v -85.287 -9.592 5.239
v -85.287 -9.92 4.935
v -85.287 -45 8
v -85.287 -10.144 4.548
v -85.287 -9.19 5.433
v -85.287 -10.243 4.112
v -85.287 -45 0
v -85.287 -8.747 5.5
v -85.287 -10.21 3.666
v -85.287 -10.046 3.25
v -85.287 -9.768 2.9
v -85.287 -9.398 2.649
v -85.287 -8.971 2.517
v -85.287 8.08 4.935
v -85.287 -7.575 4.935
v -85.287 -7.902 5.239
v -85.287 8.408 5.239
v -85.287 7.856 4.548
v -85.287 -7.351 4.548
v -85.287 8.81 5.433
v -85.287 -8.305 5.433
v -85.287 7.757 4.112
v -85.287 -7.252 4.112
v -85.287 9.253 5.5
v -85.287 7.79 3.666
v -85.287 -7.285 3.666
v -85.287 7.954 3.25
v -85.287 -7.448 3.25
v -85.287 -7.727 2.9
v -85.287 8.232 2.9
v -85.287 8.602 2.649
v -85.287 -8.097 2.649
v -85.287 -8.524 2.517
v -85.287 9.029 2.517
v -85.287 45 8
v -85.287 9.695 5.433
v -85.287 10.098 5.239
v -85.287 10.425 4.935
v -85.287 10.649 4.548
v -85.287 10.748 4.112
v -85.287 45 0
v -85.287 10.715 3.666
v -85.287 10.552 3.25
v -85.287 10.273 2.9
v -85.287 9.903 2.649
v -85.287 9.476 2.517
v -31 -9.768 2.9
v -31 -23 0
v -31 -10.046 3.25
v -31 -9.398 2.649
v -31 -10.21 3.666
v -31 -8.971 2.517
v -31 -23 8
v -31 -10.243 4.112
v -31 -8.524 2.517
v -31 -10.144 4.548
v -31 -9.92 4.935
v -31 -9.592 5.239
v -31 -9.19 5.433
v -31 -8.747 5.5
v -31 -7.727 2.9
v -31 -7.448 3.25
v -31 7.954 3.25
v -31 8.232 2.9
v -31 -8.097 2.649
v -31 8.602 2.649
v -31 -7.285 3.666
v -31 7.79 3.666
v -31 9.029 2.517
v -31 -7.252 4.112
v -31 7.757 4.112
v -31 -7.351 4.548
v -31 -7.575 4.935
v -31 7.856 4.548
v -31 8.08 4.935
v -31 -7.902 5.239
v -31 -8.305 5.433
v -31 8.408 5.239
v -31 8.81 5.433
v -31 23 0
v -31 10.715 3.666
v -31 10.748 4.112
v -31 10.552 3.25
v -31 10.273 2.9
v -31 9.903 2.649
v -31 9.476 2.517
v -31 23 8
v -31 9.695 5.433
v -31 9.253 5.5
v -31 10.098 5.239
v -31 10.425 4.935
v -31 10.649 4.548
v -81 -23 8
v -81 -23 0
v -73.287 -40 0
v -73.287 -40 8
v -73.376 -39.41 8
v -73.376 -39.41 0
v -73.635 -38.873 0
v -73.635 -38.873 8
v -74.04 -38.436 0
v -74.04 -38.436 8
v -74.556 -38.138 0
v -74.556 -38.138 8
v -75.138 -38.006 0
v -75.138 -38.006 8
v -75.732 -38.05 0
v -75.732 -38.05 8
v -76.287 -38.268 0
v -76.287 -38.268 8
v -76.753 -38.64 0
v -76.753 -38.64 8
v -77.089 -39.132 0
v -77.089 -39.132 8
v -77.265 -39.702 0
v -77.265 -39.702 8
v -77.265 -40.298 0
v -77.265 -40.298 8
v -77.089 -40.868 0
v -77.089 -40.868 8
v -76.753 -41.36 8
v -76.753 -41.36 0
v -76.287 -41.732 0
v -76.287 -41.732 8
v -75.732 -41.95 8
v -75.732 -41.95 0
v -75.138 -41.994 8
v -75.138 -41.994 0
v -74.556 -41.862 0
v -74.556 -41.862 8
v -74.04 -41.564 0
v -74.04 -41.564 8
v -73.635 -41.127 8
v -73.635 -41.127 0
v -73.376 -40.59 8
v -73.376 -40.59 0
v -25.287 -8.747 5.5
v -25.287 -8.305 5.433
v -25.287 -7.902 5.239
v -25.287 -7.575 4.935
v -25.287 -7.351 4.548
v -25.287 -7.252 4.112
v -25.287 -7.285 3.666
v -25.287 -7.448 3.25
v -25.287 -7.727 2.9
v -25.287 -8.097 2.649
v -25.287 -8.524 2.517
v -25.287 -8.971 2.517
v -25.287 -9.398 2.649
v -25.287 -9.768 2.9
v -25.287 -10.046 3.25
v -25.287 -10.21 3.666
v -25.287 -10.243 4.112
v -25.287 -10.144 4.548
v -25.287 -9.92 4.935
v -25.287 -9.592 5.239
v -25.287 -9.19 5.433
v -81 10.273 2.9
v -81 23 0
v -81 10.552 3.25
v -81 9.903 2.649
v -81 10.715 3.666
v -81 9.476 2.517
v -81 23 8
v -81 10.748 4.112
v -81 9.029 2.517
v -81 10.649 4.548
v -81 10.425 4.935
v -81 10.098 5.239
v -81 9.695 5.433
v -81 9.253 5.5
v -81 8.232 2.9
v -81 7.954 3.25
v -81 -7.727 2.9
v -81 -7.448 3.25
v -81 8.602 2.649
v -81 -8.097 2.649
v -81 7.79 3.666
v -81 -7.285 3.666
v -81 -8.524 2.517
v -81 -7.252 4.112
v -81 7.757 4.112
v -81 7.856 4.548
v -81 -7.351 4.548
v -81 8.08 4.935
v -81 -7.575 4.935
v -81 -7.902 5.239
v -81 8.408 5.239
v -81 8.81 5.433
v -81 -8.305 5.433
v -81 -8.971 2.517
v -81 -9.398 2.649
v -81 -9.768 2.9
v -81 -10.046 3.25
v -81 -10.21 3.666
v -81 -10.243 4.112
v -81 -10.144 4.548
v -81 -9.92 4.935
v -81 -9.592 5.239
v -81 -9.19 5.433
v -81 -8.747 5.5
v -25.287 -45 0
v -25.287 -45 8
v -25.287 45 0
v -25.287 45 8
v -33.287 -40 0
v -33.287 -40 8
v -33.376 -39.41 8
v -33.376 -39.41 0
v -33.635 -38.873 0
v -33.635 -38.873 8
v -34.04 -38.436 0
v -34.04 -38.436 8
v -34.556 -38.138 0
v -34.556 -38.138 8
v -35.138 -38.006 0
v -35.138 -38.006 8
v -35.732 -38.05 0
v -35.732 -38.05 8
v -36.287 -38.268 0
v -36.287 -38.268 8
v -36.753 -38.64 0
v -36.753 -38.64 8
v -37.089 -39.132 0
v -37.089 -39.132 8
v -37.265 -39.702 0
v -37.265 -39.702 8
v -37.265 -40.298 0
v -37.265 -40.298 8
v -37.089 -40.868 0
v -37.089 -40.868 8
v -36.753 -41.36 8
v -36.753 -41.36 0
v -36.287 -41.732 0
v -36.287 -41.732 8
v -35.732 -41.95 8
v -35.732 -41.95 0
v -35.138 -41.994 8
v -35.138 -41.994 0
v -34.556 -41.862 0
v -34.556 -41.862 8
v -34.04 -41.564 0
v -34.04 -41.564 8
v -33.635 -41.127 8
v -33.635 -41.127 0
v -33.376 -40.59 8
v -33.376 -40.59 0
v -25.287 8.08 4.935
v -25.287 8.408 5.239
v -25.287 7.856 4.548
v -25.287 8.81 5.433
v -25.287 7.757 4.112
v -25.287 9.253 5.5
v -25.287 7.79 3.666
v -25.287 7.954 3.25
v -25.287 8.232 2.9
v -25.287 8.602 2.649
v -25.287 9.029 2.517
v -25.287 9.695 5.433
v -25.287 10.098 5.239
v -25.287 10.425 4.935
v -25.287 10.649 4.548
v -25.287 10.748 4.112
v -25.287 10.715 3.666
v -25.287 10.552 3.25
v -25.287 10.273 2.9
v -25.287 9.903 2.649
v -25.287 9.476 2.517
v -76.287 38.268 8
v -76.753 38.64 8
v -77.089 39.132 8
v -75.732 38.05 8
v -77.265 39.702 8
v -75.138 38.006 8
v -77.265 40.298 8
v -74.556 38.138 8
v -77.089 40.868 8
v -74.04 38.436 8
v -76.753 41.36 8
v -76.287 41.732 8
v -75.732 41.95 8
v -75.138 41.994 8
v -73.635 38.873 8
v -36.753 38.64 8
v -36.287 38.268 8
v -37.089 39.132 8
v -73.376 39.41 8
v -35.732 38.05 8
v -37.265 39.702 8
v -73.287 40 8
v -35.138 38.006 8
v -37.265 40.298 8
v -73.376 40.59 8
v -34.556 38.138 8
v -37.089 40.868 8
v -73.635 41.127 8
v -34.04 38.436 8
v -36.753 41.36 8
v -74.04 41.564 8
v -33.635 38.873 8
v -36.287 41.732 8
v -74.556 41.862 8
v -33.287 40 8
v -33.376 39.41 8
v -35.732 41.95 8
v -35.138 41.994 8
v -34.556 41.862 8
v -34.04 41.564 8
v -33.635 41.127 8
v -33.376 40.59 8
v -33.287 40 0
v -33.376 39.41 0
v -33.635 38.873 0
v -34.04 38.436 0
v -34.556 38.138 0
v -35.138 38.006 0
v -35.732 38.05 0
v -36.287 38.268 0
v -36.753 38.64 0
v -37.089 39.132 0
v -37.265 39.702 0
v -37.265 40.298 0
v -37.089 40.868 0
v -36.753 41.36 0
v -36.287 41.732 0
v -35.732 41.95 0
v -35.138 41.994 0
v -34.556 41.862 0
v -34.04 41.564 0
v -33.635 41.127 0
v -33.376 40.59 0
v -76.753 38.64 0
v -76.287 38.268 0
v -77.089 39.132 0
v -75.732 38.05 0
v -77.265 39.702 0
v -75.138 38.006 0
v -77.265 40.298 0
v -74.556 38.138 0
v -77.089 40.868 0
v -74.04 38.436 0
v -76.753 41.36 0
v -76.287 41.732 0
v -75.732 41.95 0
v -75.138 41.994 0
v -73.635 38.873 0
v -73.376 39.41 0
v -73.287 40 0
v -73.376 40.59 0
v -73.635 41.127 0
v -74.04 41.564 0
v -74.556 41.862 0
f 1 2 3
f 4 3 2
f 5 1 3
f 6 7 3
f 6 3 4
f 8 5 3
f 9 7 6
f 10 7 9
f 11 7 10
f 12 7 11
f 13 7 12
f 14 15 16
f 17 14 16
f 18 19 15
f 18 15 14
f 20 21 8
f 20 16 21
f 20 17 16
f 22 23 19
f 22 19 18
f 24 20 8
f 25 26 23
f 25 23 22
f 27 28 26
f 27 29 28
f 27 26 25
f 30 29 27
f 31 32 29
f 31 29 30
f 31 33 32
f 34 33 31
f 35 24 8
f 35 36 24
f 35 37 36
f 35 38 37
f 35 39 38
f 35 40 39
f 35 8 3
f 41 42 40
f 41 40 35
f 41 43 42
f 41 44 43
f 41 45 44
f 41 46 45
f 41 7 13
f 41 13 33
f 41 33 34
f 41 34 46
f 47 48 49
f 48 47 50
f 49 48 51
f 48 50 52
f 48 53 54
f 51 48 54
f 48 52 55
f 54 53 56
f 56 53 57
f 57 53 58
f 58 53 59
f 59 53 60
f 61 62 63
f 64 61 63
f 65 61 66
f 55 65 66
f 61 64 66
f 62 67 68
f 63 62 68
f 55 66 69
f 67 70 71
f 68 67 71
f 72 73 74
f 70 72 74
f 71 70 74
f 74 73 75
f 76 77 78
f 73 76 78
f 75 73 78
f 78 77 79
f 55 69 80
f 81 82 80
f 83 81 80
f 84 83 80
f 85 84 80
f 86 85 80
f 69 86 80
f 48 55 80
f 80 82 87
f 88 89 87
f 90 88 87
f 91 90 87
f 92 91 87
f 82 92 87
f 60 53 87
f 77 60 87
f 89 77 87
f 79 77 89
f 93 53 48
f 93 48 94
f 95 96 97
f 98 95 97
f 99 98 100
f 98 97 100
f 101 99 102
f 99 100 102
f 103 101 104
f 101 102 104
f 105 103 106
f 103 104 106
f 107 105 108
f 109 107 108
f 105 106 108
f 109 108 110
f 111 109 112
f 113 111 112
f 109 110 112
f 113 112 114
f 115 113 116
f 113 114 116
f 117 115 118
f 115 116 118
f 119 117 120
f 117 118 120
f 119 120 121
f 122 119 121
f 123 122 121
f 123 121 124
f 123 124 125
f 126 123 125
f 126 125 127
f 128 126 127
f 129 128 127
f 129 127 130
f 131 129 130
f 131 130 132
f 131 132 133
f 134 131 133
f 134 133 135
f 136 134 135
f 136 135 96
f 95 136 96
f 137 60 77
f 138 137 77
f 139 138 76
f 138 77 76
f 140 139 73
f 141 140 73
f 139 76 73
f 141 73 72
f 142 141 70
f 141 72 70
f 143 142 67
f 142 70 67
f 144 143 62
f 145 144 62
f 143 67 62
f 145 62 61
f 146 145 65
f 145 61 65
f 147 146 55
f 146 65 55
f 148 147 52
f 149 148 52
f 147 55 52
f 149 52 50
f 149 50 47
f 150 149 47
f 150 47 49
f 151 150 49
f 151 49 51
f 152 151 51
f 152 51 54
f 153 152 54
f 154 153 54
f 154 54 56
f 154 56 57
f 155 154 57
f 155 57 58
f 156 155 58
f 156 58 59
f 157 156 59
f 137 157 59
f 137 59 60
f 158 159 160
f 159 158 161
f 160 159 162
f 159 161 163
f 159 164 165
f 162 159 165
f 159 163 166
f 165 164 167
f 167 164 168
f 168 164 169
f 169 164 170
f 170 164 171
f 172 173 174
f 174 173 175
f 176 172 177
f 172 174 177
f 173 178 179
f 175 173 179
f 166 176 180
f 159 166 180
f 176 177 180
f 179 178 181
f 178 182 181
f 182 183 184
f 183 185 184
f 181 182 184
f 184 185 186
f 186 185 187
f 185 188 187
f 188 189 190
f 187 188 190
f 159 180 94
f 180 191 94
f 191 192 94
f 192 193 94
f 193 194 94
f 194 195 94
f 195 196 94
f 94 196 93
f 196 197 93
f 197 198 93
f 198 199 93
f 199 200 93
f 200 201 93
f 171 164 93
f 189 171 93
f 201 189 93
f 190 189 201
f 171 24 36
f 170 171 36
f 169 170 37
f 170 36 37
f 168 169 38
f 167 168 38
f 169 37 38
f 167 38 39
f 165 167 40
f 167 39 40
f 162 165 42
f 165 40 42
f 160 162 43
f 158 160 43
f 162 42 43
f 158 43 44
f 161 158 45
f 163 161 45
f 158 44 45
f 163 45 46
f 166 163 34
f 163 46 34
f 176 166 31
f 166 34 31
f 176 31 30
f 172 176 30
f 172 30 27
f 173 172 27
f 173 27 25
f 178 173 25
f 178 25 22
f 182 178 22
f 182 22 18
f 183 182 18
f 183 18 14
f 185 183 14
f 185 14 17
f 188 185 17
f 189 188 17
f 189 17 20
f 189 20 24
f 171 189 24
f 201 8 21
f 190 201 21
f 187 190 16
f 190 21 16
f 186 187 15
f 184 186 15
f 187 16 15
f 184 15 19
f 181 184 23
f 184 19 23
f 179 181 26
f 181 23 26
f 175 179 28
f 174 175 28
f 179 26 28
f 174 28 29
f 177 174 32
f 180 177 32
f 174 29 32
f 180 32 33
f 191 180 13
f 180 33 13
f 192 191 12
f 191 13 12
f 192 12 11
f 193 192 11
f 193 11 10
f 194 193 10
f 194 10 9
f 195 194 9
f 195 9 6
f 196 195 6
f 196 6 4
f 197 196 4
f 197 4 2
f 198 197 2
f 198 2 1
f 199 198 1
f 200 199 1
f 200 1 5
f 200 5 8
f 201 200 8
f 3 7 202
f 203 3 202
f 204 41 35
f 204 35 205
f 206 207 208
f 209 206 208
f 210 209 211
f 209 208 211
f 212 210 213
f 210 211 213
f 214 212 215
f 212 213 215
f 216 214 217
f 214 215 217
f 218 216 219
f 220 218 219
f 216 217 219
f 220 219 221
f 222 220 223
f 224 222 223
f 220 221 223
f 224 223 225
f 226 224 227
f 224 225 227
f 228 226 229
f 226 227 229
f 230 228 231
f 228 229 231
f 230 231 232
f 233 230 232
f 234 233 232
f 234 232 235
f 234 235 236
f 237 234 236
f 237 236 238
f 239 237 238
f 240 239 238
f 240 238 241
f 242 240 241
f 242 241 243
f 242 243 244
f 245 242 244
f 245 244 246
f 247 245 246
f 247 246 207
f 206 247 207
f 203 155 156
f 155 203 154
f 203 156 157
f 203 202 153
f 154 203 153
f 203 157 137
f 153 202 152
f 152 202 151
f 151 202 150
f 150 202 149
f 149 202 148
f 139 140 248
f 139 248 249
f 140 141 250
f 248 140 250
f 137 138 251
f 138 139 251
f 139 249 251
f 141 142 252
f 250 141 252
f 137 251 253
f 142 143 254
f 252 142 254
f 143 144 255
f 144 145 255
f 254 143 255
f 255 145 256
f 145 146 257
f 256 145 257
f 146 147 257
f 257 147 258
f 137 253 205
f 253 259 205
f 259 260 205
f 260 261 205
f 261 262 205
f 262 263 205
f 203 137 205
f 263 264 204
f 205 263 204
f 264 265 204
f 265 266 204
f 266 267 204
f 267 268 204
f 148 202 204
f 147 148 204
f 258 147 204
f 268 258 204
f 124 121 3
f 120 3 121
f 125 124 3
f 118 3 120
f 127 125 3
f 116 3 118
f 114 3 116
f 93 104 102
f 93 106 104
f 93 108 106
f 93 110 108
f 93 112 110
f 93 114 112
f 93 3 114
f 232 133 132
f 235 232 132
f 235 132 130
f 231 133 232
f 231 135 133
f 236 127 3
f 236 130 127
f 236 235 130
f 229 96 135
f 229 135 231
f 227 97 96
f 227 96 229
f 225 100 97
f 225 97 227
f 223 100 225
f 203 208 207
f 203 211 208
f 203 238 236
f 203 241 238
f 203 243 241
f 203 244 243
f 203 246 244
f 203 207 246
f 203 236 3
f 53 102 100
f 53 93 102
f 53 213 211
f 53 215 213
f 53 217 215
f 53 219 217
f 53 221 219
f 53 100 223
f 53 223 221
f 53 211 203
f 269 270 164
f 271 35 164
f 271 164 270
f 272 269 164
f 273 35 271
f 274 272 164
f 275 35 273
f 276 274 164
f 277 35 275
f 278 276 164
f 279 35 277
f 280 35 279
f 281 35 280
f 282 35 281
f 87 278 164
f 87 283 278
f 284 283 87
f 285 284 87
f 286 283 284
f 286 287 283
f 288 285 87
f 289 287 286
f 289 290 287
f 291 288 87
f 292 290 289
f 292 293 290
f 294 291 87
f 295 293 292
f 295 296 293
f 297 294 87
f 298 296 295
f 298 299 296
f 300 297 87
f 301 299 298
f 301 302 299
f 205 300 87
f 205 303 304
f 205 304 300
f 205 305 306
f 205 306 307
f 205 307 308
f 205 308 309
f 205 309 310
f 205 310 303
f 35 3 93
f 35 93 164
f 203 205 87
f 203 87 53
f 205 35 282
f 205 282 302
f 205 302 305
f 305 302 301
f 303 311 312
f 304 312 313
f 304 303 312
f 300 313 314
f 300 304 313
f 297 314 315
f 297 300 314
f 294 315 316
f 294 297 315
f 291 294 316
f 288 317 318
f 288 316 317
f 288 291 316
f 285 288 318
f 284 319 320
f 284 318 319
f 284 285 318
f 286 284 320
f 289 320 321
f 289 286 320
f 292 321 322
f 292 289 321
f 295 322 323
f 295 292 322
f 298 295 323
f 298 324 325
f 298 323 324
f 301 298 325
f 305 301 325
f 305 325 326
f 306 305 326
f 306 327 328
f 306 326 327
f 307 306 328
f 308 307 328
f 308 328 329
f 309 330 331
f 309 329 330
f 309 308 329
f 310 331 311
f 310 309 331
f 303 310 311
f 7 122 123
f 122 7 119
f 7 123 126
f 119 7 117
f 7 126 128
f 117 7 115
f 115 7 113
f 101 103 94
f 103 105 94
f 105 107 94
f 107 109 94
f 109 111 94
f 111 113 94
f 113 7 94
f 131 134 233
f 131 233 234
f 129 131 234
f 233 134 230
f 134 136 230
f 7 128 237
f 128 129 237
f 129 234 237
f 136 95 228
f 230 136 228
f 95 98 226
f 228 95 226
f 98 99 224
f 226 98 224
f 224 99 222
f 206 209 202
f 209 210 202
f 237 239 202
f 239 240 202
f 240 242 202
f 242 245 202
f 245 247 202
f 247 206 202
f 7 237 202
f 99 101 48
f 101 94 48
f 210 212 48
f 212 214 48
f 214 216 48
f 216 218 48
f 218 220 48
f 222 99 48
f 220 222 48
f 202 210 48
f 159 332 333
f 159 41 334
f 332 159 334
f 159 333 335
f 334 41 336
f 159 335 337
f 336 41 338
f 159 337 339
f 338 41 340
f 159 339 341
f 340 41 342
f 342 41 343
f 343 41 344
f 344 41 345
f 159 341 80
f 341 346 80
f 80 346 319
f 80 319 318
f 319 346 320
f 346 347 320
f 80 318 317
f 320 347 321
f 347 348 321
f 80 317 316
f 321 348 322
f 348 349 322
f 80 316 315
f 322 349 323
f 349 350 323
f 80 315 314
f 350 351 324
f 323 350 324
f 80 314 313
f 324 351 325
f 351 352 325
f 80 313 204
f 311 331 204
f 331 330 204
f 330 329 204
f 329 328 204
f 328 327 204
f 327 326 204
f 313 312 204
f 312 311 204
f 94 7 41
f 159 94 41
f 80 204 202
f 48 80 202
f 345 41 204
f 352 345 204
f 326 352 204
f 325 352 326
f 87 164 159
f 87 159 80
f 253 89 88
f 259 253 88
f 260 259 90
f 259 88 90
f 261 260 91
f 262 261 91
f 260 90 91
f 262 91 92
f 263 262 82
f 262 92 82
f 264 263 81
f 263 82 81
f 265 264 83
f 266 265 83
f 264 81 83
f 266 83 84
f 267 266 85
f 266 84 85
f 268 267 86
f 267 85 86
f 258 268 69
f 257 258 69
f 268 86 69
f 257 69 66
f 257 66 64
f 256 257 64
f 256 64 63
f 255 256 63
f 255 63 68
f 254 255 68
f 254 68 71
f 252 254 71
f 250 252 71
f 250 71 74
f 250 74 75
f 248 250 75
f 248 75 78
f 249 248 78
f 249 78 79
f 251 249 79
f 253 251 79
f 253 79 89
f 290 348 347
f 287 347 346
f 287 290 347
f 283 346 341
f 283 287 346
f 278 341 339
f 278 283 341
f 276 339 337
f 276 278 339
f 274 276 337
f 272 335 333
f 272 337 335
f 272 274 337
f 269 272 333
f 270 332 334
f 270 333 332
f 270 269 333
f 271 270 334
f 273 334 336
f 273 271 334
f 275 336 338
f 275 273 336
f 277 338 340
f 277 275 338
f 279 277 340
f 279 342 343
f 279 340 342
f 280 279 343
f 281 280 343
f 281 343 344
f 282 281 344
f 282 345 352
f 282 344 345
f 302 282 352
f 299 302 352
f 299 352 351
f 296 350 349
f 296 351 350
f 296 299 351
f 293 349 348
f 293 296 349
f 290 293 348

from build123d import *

# Parameters (mm, degrees)
SKETCH_1_W          = 60
SKETCH_1_H          = 90
EXTRUDE_1_DEPTH     = 8
CUT_EXTRUDE_1_REACH = 98.762
SKETCH_3_R          = 2
CUT_EXTRUDE_2_DEPTH = 97.762010118
SKETCH_4_R          = 1.5
CUT_EXTRUDE_3_DEPTH = 76.425459893


with BuildPart() as part:
    # 草图1 → 凸台-拉伸1 (new body)
    with BuildSketch(Plane.XY):
        with Locations((-55.287083442, 0)):
            Rectangle(SKETCH_1_W, SKETCH_1_H)
    extrude(amount=EXTRUDE_1_DEPTH)

    # 草图2 → 切除-拉伸1 (cut, up to next)
    with BuildSketch(Plane.XY.offset(8), mode=Mode.PRIVATE) as cut_extrude_1_sk1:
        Polygon((-81, 17), (-81, 23), (-31, 23), (-31, 17), (-31, -17), (-31, -23), (-81, -23), (-81, -17), align=None)
    cut_extrude_1_tool1 = extrude(cut_extrude_1_sk1.sketch, amount=-CUT_EXTRUDE_1_REACH, mode=Mode.PRIVATE) & part.part
    add(cut_extrude_1_tool1.solids().sort_by_distance((-56, 0, 8))[0], mode=Mode.SUBTRACT)

    # 草图3 → 切除-拉伸2 (cut, through all)
    with BuildSketch(Plane.XY.offset(8)):
        with Locations((-75.287083442, -40)):
            Circle(SKETCH_3_R)
        with Locations((-35.287083442, -40)):
            Circle(SKETCH_3_R)
    cut_extrude_2 = extrude(amount=-CUT_EXTRUDE_2_DEPTH, mode=Mode.SUBTRACT)

    # 镜向1: 切除-拉伸2 across plane
    add(cut_extrude_2.mirror(Plane.ZX), mode=Mode.SUBTRACT)

    # 草图4 → 切除-拉伸3 (cut, through all)
    with BuildSketch(Plane.ZY.offset(85.287083442)):
        with Locations((4, -8.747446088)):
            Circle(SKETCH_4_R)
        with Locations((4, 9.252553912)):
            Circle(SKETCH_4_R)
    extrude(amount=-CUT_EXTRUDE_3_DEPTH, mode=Mode.SUBTRACT)


solid = part.part
